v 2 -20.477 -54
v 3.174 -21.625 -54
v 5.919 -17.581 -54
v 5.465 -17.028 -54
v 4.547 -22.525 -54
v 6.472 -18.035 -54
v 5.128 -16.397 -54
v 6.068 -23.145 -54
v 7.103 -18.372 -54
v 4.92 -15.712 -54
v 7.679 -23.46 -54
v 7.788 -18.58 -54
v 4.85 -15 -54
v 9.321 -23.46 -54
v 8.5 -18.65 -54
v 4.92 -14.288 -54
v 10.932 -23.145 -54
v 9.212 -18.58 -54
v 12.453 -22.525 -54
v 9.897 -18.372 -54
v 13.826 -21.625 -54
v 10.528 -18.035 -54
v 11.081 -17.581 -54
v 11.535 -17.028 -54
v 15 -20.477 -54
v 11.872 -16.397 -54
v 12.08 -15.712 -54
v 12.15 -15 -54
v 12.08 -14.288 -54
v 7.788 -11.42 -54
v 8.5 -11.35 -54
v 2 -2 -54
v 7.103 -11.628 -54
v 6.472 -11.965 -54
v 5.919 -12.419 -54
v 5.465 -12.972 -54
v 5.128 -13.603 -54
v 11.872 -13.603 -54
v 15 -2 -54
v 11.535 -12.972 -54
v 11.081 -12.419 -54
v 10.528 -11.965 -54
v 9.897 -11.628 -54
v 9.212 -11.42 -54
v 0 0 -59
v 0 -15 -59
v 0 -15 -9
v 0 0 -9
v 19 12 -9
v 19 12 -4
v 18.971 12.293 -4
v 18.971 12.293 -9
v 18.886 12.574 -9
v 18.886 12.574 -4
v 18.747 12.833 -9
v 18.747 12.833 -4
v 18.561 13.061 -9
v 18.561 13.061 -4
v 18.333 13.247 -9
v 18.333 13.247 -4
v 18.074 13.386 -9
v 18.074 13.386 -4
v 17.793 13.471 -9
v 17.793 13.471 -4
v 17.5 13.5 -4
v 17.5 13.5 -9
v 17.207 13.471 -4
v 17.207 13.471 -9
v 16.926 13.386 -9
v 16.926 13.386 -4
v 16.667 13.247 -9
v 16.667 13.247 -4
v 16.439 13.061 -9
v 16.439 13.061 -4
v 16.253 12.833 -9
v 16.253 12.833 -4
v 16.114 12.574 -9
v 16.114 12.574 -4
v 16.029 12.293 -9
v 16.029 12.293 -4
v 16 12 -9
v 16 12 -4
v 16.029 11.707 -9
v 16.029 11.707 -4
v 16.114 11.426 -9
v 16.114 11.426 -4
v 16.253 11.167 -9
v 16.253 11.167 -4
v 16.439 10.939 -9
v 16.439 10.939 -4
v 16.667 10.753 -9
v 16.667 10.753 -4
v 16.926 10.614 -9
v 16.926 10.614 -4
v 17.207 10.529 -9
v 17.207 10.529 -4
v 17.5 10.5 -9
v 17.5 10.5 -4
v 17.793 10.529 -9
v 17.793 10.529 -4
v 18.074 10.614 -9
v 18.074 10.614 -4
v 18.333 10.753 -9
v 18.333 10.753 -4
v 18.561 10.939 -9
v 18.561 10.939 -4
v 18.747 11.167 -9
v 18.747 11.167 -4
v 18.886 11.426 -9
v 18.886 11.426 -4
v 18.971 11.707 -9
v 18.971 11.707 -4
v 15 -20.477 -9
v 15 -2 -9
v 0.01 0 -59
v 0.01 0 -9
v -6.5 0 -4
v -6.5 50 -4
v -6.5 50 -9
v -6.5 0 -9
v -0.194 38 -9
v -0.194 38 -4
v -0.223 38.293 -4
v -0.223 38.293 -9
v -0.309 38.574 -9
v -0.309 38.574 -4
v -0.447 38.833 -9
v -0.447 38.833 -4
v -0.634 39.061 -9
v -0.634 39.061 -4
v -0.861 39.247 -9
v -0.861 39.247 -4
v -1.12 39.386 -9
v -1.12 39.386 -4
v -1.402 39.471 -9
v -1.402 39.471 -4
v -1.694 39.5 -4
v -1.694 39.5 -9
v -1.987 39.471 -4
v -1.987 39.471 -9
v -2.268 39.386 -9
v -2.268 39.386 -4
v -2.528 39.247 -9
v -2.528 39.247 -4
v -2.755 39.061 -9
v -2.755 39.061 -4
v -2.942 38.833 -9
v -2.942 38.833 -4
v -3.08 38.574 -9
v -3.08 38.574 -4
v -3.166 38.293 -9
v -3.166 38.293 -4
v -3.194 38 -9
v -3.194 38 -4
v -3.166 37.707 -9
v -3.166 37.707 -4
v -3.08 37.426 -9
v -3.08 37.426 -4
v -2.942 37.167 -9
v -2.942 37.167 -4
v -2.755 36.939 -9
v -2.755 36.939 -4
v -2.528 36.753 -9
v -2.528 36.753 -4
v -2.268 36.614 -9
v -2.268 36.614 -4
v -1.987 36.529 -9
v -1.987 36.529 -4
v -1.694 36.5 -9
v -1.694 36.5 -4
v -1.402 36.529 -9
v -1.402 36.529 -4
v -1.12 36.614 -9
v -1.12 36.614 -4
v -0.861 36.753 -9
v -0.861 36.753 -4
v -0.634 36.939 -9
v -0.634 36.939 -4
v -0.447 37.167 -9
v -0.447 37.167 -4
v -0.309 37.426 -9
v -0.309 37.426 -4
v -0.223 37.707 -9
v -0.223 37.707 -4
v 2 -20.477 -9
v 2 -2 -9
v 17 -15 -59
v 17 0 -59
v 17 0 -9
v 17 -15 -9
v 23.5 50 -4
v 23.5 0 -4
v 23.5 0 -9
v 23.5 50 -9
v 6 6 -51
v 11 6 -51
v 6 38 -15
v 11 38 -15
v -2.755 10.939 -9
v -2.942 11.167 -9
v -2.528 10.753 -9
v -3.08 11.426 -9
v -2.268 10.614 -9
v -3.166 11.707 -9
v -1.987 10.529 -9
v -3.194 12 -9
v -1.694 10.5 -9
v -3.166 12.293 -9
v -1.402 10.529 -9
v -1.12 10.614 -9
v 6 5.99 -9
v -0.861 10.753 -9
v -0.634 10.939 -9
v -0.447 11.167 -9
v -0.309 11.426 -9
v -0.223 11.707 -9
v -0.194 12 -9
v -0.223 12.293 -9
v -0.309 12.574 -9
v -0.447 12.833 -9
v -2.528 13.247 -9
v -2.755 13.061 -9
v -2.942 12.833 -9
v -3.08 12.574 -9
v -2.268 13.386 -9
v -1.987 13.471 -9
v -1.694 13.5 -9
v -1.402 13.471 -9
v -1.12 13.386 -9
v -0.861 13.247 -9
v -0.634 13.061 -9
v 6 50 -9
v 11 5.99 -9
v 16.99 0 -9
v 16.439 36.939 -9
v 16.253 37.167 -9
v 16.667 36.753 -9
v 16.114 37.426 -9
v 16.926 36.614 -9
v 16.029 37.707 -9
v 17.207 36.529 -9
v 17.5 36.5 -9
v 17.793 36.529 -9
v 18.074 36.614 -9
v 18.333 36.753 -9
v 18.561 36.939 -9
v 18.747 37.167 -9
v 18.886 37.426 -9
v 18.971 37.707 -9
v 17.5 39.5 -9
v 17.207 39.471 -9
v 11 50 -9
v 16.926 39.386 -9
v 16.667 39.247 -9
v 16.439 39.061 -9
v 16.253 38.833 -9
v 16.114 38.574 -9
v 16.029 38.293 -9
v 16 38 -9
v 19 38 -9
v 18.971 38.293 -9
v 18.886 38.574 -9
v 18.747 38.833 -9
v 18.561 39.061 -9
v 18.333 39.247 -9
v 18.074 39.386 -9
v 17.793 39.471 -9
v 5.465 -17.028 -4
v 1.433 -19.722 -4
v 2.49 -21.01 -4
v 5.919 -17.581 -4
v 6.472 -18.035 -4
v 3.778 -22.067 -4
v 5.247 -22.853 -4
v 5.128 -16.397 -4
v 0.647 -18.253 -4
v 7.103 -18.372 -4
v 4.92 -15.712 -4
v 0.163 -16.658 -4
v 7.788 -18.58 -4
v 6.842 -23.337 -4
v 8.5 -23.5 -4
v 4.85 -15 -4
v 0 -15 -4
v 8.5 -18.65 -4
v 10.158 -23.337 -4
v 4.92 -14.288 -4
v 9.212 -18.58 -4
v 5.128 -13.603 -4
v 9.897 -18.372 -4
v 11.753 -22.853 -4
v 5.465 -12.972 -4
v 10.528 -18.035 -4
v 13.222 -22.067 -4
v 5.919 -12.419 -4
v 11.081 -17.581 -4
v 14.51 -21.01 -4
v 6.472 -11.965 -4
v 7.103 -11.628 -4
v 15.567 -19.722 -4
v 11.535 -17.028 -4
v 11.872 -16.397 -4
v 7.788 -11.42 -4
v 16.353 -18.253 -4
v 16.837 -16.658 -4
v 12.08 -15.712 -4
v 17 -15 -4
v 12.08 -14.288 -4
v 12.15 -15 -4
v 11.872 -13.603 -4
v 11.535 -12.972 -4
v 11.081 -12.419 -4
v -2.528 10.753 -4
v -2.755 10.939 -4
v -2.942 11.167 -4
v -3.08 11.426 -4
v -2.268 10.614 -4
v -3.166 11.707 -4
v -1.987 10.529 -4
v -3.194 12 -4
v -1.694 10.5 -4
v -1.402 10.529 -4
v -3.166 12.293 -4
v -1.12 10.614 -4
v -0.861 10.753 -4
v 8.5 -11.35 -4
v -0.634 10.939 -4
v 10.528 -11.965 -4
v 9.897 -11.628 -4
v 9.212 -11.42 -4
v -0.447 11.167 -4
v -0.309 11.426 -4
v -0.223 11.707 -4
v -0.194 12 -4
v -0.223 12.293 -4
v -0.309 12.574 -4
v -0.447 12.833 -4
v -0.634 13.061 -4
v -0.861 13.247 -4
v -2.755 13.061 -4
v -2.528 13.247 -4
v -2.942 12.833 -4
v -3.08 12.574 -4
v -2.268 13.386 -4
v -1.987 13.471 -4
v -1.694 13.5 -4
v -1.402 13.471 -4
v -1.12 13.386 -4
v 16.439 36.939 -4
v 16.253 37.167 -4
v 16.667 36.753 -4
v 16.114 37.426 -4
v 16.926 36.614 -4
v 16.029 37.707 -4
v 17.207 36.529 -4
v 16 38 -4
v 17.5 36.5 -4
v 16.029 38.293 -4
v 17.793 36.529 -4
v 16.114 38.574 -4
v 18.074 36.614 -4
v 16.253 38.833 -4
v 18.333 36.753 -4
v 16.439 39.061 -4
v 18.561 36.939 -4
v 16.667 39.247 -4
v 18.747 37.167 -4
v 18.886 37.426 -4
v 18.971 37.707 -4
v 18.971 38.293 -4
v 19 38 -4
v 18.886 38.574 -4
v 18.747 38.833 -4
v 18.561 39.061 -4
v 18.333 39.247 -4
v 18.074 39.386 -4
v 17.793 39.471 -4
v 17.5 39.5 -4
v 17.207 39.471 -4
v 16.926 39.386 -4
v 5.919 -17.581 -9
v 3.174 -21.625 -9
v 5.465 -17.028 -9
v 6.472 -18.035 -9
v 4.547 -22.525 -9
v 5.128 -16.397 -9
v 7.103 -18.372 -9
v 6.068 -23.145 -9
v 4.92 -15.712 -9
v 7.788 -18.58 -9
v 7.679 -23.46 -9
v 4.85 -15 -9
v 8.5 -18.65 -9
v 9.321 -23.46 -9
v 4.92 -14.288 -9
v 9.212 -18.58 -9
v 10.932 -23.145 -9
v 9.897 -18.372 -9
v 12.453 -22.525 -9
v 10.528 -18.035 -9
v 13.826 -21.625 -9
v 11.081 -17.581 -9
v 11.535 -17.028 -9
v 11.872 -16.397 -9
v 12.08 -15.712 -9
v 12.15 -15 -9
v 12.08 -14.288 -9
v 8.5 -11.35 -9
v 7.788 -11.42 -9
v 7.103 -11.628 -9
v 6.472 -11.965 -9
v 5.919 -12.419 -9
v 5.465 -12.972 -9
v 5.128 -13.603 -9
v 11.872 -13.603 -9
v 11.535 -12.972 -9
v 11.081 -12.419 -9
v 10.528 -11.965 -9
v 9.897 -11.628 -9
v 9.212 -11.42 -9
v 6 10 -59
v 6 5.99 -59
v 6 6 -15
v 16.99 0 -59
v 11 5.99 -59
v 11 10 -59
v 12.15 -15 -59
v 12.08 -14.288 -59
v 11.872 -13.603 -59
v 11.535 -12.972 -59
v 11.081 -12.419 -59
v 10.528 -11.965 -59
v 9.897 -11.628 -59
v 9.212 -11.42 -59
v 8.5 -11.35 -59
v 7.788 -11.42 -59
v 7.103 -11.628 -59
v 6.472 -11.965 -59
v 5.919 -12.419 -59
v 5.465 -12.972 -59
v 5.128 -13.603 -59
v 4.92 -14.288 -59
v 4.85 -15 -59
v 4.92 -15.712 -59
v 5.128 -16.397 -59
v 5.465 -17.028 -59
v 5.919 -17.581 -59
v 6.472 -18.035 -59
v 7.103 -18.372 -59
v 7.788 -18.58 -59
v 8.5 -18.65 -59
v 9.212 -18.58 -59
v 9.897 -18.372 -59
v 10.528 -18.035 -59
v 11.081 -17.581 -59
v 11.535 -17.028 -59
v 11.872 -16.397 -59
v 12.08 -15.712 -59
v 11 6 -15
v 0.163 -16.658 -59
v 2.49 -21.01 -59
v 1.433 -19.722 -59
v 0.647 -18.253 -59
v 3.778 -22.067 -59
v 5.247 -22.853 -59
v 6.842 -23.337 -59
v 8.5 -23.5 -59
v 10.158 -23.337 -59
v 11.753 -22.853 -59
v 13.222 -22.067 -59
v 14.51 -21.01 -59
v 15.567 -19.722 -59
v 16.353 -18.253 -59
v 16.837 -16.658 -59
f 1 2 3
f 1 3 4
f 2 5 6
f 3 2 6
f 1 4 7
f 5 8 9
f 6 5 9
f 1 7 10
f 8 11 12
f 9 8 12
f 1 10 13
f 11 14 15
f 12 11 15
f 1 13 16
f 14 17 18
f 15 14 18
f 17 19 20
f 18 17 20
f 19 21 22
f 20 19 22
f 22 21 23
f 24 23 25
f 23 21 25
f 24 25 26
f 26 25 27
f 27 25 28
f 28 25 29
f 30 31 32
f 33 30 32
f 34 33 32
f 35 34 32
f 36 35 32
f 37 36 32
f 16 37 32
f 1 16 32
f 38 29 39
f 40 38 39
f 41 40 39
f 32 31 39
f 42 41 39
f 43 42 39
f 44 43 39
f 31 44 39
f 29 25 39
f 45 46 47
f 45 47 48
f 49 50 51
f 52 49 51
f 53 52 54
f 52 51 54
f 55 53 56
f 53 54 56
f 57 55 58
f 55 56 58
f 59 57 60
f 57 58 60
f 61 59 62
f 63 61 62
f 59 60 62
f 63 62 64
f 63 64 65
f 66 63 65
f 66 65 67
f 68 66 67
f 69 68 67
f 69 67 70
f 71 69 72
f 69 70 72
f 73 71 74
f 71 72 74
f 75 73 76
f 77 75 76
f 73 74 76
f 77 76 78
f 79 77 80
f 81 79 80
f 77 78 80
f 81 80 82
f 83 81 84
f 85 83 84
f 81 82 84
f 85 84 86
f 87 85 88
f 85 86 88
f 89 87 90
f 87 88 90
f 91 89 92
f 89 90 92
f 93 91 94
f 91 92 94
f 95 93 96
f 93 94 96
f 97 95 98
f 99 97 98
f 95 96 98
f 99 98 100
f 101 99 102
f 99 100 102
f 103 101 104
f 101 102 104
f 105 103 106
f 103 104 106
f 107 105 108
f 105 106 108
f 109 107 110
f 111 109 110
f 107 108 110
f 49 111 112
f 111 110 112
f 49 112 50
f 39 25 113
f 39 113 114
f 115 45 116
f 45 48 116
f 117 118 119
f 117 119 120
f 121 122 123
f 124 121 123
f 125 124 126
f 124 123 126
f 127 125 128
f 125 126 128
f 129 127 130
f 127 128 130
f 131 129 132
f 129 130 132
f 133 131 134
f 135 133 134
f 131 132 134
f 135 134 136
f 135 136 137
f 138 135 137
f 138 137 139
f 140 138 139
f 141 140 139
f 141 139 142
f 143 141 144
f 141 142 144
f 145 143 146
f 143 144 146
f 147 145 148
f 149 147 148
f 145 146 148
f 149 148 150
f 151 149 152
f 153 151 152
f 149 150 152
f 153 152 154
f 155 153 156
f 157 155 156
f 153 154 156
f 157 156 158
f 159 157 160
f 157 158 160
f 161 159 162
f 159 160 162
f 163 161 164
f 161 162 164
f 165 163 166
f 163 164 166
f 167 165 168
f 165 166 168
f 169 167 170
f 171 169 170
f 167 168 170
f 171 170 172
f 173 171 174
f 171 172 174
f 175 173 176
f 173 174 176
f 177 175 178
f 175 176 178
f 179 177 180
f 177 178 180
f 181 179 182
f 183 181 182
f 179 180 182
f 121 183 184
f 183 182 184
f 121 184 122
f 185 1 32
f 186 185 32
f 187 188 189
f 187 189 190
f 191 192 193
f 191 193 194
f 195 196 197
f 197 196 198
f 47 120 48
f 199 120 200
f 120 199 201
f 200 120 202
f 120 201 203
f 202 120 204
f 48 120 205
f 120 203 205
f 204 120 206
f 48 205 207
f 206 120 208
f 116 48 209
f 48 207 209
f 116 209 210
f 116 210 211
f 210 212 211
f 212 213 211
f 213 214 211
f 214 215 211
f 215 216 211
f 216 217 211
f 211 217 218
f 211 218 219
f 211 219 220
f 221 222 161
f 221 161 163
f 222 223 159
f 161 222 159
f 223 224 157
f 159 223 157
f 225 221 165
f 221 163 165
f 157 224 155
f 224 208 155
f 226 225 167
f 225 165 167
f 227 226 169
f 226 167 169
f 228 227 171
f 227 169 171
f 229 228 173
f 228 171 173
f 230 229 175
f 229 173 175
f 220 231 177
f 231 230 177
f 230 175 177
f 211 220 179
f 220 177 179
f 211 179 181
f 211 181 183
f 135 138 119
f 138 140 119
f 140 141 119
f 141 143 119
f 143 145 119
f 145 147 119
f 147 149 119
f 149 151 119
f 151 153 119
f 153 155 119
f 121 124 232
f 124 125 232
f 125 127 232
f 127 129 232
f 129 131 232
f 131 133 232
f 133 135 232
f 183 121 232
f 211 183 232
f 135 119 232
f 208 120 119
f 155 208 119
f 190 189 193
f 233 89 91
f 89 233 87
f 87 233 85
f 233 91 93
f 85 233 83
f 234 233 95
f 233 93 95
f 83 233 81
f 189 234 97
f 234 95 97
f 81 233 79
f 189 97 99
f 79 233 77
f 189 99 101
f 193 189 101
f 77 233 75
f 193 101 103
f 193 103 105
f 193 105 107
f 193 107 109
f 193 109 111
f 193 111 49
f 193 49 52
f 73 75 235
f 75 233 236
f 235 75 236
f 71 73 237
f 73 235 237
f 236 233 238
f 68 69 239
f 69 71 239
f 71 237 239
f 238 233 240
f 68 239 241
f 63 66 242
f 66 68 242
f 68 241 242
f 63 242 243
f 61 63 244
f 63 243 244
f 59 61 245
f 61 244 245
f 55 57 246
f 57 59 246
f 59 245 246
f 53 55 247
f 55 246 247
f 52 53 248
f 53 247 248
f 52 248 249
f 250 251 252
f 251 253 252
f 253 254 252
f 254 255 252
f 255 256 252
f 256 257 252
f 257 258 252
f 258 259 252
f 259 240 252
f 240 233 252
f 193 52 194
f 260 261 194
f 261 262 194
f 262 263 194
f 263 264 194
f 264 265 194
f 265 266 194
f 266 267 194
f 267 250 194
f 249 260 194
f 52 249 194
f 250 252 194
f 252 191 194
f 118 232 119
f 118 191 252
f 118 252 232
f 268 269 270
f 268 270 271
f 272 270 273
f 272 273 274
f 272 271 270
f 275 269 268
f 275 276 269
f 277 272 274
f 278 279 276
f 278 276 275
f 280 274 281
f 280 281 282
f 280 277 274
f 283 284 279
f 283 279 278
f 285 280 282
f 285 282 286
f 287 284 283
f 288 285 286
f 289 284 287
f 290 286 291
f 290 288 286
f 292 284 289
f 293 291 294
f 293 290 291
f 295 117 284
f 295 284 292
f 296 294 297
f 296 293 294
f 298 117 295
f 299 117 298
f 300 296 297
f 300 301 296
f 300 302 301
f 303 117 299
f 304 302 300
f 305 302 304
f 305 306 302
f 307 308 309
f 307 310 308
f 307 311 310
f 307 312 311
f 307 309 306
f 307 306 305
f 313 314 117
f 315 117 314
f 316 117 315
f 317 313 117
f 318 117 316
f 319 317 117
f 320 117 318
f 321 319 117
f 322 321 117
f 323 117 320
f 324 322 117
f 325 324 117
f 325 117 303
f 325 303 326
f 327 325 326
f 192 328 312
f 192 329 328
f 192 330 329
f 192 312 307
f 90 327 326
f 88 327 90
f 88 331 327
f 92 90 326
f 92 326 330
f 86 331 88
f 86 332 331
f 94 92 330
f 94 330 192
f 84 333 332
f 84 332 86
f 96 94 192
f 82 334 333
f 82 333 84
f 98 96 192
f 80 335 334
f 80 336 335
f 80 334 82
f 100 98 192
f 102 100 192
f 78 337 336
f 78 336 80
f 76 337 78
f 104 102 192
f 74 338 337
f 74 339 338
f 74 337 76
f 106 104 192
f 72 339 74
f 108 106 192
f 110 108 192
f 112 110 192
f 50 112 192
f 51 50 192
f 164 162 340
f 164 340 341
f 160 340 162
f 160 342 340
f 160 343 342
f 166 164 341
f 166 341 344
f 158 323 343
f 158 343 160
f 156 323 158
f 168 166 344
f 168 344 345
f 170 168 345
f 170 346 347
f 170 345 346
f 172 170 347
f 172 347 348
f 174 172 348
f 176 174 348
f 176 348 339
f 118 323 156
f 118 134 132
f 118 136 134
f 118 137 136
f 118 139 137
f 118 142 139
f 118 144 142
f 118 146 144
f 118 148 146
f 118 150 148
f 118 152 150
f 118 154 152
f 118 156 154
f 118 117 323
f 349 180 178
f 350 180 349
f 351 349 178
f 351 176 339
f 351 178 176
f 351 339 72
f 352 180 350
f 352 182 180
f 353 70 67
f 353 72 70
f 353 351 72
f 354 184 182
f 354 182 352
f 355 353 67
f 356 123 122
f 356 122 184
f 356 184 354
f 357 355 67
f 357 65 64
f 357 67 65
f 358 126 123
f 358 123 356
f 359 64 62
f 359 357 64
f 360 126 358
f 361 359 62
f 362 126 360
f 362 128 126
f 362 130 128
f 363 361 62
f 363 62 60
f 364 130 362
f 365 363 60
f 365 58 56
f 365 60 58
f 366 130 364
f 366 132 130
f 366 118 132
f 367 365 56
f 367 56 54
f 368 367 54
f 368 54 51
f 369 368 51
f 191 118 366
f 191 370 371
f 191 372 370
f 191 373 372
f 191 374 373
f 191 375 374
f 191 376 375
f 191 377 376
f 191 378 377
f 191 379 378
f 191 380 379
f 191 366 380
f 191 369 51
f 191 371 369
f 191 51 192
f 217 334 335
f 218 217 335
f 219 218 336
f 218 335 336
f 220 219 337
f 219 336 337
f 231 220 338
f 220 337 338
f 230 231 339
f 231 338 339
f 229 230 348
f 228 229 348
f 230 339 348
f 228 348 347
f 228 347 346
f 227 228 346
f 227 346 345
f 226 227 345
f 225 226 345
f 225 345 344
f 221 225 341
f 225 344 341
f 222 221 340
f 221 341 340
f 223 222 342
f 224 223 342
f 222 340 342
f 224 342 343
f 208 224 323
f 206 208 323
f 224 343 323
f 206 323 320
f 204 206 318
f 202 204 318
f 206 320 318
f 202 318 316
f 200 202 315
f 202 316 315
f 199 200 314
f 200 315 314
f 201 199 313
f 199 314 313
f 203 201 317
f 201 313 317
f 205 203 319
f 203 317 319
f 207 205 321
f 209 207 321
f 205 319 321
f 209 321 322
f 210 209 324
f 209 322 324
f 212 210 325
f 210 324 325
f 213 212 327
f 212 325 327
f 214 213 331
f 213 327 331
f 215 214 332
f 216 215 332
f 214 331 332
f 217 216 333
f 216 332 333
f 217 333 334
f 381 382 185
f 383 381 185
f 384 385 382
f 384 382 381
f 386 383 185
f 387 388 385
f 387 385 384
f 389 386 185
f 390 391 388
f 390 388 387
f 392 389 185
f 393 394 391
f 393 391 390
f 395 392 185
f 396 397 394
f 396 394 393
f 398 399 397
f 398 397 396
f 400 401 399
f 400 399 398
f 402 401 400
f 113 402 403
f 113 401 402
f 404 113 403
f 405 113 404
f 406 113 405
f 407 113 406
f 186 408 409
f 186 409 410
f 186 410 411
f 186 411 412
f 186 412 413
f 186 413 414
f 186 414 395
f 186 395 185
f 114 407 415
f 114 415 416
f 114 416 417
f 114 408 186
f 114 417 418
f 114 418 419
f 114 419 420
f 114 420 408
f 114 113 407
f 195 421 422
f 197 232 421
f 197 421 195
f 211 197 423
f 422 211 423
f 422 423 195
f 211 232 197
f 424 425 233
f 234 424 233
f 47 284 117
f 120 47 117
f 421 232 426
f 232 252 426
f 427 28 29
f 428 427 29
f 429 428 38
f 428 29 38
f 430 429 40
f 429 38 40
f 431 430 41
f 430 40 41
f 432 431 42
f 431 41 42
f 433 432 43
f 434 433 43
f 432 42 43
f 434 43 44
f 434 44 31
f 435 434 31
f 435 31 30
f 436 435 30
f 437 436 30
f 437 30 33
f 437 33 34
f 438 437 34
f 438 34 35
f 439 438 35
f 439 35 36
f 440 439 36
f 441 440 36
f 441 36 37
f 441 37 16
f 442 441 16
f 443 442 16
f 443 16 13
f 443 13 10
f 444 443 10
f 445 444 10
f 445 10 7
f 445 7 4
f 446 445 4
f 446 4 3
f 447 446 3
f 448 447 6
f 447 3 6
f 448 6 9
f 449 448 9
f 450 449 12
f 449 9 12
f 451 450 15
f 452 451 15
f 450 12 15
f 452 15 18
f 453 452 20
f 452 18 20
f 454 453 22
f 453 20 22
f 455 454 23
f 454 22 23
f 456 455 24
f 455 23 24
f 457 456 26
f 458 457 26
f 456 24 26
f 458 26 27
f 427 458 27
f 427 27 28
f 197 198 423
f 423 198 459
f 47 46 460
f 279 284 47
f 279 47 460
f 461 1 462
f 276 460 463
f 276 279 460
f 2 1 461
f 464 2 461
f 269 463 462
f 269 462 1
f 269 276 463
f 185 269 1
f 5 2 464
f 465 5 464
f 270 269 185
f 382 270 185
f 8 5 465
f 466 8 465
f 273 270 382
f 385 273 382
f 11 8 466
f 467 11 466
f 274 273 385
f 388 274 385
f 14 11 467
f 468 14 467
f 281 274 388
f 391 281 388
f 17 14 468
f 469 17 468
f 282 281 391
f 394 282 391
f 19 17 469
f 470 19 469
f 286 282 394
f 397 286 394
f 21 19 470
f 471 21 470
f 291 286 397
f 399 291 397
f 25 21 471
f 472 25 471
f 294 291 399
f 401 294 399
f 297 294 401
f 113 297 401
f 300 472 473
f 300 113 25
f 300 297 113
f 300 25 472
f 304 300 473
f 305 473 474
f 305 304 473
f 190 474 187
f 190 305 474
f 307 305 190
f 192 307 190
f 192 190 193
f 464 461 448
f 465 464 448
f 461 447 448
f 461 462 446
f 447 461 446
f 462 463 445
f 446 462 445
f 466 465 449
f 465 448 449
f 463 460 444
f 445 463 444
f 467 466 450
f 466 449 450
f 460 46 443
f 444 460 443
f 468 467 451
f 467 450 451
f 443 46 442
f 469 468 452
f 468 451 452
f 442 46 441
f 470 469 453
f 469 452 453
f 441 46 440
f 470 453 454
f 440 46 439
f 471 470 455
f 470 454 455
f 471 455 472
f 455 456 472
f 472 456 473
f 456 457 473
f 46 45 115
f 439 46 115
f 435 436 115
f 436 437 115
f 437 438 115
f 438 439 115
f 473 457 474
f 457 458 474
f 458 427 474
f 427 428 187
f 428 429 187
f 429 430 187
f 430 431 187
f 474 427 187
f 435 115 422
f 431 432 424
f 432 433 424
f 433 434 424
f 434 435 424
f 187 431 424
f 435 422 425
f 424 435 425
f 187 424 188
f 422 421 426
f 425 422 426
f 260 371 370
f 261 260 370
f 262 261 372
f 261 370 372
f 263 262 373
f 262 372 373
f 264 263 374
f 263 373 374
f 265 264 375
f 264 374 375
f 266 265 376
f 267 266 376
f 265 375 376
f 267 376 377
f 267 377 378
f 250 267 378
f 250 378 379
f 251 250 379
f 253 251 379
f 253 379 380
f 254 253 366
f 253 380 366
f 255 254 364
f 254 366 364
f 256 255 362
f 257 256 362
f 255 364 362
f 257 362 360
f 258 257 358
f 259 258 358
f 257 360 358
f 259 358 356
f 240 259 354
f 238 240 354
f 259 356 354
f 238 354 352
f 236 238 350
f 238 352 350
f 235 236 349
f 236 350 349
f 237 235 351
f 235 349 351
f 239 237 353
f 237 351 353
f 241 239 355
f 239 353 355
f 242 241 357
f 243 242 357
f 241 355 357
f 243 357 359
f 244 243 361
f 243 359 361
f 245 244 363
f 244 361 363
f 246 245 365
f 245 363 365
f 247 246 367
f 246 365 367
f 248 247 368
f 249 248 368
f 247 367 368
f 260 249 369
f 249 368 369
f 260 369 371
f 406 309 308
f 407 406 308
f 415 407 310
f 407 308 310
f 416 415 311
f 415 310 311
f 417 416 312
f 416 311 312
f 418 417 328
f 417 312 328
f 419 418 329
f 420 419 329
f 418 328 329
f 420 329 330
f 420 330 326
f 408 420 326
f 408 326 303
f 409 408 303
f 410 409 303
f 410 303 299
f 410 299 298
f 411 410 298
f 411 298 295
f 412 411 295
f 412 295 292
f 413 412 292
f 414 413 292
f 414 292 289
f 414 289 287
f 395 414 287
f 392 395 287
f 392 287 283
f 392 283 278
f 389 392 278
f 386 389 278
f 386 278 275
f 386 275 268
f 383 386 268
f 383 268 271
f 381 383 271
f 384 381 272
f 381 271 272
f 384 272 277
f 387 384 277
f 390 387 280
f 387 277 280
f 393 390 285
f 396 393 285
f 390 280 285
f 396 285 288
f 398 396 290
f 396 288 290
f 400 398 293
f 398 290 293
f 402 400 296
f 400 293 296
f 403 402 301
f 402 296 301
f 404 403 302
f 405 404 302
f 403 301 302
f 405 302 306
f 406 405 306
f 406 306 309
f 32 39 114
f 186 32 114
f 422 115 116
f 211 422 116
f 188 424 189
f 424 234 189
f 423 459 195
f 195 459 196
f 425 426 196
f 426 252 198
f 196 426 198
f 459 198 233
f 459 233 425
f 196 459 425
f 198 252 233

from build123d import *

# Parameters (mm, degrees)
SKETCH007_R     = 3.65
PAD005_DEPTH    = 55
SKETCH008_R     = 1.5
SKETCH008_R_2   = 3.7
PAD006_DEPTH    = 5
PAD007_DEPTH    = 2.5
SKETCH010_W     = 40
SKETCH010_H     = 45
POCKET001_DEPTH = 6.5
CHAMFER_SIZE    = 5.99


with BuildPart() as part:
    # Sketch007 → Pad005 (new body)
    with BuildSketch(Plane.XY):
        with BuildLine():
            ThreePointArc((0, -15), (8.5, -23.5), (17, -15))
            Line((17, 0), (17, -15))
            Line((0, 0), (17, 0))
            Line((0, -15), (0, 0))
        make_face()
        with Locations((8.5, -15)):
            Circle(SKETCH007_R, mode=Mode.SUBTRACT)
    extrude(amount=-PAD005_DEPTH)

    # Sketch008 → Pad006 (join)
    with BuildSketch(Plane.XY):
        with BuildLine():
            Line((23.5, 0), (23.5, 50))
            Line((23.5, 50), (-6.5, 50))
            Line((-6.5, 50), (-6.5, 0))
            Line((0, -15), (-6.5, 0))
            ThreePointArc((0, -15), (8.5, -23.5), (17, -15))
            Line((17, -15), (23.5, 0))
        make_face()
        with Locations((17.5, 12)):
            Circle(SKETCH008_R, mode=Mode.SUBTRACT)
        with Locations((17.5, 38)):
            Circle(SKETCH008_R, mode=Mode.SUBTRACT)
        with Locations((-1.694422, 38)):
            Circle(SKETCH008_R, mode=Mode.SUBTRACT)
        with Locations((-1.694422, 12)):
            Circle(SKETCH008_R, mode=Mode.SUBTRACT)
        with Locations((8.5, -15)):
            Circle(SKETCH008_R_2, mode=Mode.SUBTRACT)
    extrude(amount=-PAD006_DEPTH)

    # Sketch009 (on DatumPlane) → Pad007 (join, symmetric)
    with BuildSketch(Plane(origin=(8.5, 0, 1), x_dir=(0, 1, 0), z_dir=(1, 0, 0))):
        Polygon((0, -56), (0, -6), (50, -6), (10, -56), align=None)
        Polygon((6, -12), (6, -48), (38, -12), align=None, mode=Mode.SUBTRACT)
    extrude(amount=PAD007_DEPTH, both=True)

    # Sketch010 (on DatumPlane) → Pocket001 (cut, symmetric)
    with BuildSketch(Plane(origin=(8.5, 0, 1), x_dir=(0, 1, 0), z_dir=(1, 0, 0))):
        with Locations((-22, -28.5)):
            Rectangle(SKETCH010_W, SKETCH010_H)
    extrude(amount=POCKET001_DEPTH, both=True, mode=Mode.SUBTRACT)

    # Chamfer
    chamfer_edges = [part.edges().sort_by_distance(p)[0] for p in [
        (6, 0, -30),
        (11, 0, -30),
    ]]
    chamfer(chamfer_edges, length=CHAMFER_SIZE)


with BuildPart() as part_1:
    # Body003 placement: moved
    add(part.part.moved(Location((0, 0, -4))))


solid = part_1.part
